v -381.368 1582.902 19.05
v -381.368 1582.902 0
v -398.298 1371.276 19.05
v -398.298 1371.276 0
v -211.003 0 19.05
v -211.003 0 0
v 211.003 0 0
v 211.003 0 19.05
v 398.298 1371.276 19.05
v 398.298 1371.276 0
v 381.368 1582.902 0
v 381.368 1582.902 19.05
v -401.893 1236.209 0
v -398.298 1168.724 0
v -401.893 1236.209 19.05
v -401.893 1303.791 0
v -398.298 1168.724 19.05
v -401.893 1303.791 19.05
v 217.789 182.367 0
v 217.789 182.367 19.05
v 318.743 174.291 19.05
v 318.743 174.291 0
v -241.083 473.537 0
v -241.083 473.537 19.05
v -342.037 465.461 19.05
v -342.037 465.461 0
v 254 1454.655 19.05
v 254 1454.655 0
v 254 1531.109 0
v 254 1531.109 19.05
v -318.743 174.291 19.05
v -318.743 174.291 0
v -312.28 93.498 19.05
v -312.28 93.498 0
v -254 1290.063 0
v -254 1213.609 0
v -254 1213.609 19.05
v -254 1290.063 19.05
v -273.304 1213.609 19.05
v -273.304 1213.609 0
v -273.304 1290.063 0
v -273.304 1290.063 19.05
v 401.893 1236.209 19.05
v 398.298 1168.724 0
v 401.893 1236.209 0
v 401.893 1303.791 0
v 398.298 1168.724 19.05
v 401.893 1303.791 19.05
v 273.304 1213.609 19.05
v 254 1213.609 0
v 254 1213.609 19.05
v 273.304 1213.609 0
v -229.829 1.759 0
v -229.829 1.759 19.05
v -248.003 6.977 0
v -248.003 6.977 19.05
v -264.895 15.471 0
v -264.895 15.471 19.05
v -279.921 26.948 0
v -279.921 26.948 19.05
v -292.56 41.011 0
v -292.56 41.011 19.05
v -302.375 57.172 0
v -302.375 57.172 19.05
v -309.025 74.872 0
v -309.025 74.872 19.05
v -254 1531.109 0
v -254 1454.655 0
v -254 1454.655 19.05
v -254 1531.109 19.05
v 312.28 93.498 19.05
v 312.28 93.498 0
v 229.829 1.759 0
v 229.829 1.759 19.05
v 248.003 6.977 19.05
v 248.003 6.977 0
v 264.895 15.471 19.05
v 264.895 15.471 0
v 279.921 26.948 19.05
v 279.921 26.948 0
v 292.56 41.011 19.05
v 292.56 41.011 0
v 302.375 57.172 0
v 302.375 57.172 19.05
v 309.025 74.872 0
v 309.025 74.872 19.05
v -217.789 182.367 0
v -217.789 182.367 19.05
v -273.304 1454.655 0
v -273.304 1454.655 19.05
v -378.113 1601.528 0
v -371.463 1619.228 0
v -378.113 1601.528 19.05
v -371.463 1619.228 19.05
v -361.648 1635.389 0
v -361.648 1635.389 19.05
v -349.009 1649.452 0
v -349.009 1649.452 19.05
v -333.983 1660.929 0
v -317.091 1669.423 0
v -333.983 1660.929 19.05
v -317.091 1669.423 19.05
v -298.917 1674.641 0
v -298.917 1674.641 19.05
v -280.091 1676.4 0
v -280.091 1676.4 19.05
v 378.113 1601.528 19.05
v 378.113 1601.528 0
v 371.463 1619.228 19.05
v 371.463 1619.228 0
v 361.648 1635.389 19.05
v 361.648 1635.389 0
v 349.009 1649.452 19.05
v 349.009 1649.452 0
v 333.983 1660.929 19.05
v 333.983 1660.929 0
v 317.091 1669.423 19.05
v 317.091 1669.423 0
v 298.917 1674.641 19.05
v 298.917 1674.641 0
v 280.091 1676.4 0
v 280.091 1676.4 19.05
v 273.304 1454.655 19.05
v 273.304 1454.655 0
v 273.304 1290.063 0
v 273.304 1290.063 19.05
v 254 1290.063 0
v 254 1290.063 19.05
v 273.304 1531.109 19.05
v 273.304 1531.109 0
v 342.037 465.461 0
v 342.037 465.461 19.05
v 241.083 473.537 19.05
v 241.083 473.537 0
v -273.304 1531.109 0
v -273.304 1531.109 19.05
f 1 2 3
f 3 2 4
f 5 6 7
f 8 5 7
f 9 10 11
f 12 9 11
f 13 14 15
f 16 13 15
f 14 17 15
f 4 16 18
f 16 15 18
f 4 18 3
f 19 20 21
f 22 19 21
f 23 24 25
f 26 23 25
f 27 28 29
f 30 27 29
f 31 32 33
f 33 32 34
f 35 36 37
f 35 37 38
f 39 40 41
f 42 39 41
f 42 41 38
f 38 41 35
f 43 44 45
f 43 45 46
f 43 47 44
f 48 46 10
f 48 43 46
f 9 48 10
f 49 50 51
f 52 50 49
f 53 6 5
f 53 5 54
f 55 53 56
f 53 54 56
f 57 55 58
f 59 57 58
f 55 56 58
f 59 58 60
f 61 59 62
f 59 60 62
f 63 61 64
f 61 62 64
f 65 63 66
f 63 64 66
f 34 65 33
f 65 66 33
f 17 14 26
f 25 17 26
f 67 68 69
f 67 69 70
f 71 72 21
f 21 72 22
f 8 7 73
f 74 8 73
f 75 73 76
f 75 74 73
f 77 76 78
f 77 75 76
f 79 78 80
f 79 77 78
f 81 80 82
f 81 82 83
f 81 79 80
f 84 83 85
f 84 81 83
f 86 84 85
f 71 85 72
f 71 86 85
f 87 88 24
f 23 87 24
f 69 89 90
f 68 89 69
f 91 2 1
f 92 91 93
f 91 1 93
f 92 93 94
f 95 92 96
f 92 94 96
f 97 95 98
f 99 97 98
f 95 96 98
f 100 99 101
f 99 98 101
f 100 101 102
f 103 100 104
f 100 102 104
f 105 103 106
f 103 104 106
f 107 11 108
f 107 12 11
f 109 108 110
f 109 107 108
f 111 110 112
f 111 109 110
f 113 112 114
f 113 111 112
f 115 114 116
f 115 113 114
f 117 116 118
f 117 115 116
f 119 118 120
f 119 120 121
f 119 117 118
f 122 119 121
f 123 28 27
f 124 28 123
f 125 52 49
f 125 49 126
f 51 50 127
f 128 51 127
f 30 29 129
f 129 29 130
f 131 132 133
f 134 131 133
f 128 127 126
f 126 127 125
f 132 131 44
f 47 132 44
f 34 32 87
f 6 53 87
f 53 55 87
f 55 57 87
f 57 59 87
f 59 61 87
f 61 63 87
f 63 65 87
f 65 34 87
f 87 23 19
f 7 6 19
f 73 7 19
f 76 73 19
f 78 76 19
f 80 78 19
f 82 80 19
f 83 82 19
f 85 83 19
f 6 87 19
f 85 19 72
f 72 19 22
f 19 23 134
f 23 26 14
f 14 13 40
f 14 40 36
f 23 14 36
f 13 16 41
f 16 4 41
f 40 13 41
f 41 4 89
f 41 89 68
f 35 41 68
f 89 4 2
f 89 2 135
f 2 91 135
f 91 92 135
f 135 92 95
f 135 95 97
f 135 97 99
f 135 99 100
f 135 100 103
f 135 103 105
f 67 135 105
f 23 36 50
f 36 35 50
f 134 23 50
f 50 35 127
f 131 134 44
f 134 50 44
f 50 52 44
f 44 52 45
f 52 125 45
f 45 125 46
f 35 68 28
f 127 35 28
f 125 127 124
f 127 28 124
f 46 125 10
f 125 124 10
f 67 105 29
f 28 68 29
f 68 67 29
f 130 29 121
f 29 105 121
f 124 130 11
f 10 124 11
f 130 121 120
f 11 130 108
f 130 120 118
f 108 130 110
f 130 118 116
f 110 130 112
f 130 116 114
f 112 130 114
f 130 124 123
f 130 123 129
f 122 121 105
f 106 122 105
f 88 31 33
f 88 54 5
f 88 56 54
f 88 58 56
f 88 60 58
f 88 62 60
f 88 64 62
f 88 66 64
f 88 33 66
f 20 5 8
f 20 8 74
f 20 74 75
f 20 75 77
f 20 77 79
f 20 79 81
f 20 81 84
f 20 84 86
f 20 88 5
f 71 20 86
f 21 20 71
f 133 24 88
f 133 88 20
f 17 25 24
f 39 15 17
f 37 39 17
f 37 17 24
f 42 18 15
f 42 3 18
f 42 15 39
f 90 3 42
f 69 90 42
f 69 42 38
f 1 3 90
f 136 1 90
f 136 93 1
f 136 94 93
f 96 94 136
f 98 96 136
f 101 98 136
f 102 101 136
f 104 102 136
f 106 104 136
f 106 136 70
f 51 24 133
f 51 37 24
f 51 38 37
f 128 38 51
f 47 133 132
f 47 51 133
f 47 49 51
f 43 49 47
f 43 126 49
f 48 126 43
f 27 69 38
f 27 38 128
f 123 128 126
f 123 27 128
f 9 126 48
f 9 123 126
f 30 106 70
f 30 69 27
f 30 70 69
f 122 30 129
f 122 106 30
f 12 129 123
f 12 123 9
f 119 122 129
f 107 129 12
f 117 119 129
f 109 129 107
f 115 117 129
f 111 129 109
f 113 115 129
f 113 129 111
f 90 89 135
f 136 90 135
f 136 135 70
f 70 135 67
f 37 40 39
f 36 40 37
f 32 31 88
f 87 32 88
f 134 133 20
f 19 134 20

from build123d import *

# Parameters (mm, degrees)
F0_W     = 19.304
F0_H     = 76.454
F1_DEPTH = 19.05
F2_R     = 101.6
F3_R     = 1270
F5_DEPTH = 187.96


with BuildPart() as f1:
    # F0 (on Top) → F1 (new body)
    with BuildSketch(Plane.XY):
        Polygon((-304.8, 0), (0, 0), (304.8, 0), (406.4, 1270), (373.888, 1676.4), (0, 1676.4), (-373.888, 1676.4), (-406.4, 1270), align=None)
        with Locations((-263.652, 1251.83646)):
            Rectangle(F0_W, F0_H, mode=Mode.SUBTRACT)
        with Locations((-263.652, 1492.88246)):
            Rectangle(F0_W, F0_H, mode=Mode.SUBTRACT)
        with Locations((263.652, 1251.83646)):
            Rectangle(F0_W, F0_H, mode=Mode.SUBTRACT)
        with Locations((263.652, 1492.88246)):
            Rectangle(F0_W, F0_H, mode=Mode.SUBTRACT)
    extrude(amount=F1_DEPTH)

    # F2
    f2_edges = [f1.edges().sort_by_distance(p)[0] for p in [
        (-304.8, 0, 9.525),
        (304.8, 0, 9.525),
        (-373.888, 1676.4, 9.525),
        (373.888, 1676.4, 9.525),
    ]]
    fillet(f2_edges, radius=F2_R)

    # F3
    f3_edges = [f1.edges().sort_by_distance(p)[0] for p in [
        (-406.4, 1270, 9.525),
        (406.4, 1270, 9.525),
    ]]
    fillet(f3_edges, radius=F3_R)

    # F4 (on face) → F5 (cut)
    with BuildSketch(Plane.XY.offset(19.05)):
        Polygon((-217.7893998235, 182.3674977936), (-241.0829792523, 473.537240654), (-342.0368743239, 465.4609290482), (-318.743294895, 174.2911861878), align=None)
        Polygon((217.7893998235, 182.3674977936), (318.743294895, 174.2911861878), (342.0368743239, 465.4609290482), (241.0829792523, 473.537240654), align=None)
    extrude(amount=-F5_DEPTH, mode=Mode.SUBTRACT)


solid = f1.part
